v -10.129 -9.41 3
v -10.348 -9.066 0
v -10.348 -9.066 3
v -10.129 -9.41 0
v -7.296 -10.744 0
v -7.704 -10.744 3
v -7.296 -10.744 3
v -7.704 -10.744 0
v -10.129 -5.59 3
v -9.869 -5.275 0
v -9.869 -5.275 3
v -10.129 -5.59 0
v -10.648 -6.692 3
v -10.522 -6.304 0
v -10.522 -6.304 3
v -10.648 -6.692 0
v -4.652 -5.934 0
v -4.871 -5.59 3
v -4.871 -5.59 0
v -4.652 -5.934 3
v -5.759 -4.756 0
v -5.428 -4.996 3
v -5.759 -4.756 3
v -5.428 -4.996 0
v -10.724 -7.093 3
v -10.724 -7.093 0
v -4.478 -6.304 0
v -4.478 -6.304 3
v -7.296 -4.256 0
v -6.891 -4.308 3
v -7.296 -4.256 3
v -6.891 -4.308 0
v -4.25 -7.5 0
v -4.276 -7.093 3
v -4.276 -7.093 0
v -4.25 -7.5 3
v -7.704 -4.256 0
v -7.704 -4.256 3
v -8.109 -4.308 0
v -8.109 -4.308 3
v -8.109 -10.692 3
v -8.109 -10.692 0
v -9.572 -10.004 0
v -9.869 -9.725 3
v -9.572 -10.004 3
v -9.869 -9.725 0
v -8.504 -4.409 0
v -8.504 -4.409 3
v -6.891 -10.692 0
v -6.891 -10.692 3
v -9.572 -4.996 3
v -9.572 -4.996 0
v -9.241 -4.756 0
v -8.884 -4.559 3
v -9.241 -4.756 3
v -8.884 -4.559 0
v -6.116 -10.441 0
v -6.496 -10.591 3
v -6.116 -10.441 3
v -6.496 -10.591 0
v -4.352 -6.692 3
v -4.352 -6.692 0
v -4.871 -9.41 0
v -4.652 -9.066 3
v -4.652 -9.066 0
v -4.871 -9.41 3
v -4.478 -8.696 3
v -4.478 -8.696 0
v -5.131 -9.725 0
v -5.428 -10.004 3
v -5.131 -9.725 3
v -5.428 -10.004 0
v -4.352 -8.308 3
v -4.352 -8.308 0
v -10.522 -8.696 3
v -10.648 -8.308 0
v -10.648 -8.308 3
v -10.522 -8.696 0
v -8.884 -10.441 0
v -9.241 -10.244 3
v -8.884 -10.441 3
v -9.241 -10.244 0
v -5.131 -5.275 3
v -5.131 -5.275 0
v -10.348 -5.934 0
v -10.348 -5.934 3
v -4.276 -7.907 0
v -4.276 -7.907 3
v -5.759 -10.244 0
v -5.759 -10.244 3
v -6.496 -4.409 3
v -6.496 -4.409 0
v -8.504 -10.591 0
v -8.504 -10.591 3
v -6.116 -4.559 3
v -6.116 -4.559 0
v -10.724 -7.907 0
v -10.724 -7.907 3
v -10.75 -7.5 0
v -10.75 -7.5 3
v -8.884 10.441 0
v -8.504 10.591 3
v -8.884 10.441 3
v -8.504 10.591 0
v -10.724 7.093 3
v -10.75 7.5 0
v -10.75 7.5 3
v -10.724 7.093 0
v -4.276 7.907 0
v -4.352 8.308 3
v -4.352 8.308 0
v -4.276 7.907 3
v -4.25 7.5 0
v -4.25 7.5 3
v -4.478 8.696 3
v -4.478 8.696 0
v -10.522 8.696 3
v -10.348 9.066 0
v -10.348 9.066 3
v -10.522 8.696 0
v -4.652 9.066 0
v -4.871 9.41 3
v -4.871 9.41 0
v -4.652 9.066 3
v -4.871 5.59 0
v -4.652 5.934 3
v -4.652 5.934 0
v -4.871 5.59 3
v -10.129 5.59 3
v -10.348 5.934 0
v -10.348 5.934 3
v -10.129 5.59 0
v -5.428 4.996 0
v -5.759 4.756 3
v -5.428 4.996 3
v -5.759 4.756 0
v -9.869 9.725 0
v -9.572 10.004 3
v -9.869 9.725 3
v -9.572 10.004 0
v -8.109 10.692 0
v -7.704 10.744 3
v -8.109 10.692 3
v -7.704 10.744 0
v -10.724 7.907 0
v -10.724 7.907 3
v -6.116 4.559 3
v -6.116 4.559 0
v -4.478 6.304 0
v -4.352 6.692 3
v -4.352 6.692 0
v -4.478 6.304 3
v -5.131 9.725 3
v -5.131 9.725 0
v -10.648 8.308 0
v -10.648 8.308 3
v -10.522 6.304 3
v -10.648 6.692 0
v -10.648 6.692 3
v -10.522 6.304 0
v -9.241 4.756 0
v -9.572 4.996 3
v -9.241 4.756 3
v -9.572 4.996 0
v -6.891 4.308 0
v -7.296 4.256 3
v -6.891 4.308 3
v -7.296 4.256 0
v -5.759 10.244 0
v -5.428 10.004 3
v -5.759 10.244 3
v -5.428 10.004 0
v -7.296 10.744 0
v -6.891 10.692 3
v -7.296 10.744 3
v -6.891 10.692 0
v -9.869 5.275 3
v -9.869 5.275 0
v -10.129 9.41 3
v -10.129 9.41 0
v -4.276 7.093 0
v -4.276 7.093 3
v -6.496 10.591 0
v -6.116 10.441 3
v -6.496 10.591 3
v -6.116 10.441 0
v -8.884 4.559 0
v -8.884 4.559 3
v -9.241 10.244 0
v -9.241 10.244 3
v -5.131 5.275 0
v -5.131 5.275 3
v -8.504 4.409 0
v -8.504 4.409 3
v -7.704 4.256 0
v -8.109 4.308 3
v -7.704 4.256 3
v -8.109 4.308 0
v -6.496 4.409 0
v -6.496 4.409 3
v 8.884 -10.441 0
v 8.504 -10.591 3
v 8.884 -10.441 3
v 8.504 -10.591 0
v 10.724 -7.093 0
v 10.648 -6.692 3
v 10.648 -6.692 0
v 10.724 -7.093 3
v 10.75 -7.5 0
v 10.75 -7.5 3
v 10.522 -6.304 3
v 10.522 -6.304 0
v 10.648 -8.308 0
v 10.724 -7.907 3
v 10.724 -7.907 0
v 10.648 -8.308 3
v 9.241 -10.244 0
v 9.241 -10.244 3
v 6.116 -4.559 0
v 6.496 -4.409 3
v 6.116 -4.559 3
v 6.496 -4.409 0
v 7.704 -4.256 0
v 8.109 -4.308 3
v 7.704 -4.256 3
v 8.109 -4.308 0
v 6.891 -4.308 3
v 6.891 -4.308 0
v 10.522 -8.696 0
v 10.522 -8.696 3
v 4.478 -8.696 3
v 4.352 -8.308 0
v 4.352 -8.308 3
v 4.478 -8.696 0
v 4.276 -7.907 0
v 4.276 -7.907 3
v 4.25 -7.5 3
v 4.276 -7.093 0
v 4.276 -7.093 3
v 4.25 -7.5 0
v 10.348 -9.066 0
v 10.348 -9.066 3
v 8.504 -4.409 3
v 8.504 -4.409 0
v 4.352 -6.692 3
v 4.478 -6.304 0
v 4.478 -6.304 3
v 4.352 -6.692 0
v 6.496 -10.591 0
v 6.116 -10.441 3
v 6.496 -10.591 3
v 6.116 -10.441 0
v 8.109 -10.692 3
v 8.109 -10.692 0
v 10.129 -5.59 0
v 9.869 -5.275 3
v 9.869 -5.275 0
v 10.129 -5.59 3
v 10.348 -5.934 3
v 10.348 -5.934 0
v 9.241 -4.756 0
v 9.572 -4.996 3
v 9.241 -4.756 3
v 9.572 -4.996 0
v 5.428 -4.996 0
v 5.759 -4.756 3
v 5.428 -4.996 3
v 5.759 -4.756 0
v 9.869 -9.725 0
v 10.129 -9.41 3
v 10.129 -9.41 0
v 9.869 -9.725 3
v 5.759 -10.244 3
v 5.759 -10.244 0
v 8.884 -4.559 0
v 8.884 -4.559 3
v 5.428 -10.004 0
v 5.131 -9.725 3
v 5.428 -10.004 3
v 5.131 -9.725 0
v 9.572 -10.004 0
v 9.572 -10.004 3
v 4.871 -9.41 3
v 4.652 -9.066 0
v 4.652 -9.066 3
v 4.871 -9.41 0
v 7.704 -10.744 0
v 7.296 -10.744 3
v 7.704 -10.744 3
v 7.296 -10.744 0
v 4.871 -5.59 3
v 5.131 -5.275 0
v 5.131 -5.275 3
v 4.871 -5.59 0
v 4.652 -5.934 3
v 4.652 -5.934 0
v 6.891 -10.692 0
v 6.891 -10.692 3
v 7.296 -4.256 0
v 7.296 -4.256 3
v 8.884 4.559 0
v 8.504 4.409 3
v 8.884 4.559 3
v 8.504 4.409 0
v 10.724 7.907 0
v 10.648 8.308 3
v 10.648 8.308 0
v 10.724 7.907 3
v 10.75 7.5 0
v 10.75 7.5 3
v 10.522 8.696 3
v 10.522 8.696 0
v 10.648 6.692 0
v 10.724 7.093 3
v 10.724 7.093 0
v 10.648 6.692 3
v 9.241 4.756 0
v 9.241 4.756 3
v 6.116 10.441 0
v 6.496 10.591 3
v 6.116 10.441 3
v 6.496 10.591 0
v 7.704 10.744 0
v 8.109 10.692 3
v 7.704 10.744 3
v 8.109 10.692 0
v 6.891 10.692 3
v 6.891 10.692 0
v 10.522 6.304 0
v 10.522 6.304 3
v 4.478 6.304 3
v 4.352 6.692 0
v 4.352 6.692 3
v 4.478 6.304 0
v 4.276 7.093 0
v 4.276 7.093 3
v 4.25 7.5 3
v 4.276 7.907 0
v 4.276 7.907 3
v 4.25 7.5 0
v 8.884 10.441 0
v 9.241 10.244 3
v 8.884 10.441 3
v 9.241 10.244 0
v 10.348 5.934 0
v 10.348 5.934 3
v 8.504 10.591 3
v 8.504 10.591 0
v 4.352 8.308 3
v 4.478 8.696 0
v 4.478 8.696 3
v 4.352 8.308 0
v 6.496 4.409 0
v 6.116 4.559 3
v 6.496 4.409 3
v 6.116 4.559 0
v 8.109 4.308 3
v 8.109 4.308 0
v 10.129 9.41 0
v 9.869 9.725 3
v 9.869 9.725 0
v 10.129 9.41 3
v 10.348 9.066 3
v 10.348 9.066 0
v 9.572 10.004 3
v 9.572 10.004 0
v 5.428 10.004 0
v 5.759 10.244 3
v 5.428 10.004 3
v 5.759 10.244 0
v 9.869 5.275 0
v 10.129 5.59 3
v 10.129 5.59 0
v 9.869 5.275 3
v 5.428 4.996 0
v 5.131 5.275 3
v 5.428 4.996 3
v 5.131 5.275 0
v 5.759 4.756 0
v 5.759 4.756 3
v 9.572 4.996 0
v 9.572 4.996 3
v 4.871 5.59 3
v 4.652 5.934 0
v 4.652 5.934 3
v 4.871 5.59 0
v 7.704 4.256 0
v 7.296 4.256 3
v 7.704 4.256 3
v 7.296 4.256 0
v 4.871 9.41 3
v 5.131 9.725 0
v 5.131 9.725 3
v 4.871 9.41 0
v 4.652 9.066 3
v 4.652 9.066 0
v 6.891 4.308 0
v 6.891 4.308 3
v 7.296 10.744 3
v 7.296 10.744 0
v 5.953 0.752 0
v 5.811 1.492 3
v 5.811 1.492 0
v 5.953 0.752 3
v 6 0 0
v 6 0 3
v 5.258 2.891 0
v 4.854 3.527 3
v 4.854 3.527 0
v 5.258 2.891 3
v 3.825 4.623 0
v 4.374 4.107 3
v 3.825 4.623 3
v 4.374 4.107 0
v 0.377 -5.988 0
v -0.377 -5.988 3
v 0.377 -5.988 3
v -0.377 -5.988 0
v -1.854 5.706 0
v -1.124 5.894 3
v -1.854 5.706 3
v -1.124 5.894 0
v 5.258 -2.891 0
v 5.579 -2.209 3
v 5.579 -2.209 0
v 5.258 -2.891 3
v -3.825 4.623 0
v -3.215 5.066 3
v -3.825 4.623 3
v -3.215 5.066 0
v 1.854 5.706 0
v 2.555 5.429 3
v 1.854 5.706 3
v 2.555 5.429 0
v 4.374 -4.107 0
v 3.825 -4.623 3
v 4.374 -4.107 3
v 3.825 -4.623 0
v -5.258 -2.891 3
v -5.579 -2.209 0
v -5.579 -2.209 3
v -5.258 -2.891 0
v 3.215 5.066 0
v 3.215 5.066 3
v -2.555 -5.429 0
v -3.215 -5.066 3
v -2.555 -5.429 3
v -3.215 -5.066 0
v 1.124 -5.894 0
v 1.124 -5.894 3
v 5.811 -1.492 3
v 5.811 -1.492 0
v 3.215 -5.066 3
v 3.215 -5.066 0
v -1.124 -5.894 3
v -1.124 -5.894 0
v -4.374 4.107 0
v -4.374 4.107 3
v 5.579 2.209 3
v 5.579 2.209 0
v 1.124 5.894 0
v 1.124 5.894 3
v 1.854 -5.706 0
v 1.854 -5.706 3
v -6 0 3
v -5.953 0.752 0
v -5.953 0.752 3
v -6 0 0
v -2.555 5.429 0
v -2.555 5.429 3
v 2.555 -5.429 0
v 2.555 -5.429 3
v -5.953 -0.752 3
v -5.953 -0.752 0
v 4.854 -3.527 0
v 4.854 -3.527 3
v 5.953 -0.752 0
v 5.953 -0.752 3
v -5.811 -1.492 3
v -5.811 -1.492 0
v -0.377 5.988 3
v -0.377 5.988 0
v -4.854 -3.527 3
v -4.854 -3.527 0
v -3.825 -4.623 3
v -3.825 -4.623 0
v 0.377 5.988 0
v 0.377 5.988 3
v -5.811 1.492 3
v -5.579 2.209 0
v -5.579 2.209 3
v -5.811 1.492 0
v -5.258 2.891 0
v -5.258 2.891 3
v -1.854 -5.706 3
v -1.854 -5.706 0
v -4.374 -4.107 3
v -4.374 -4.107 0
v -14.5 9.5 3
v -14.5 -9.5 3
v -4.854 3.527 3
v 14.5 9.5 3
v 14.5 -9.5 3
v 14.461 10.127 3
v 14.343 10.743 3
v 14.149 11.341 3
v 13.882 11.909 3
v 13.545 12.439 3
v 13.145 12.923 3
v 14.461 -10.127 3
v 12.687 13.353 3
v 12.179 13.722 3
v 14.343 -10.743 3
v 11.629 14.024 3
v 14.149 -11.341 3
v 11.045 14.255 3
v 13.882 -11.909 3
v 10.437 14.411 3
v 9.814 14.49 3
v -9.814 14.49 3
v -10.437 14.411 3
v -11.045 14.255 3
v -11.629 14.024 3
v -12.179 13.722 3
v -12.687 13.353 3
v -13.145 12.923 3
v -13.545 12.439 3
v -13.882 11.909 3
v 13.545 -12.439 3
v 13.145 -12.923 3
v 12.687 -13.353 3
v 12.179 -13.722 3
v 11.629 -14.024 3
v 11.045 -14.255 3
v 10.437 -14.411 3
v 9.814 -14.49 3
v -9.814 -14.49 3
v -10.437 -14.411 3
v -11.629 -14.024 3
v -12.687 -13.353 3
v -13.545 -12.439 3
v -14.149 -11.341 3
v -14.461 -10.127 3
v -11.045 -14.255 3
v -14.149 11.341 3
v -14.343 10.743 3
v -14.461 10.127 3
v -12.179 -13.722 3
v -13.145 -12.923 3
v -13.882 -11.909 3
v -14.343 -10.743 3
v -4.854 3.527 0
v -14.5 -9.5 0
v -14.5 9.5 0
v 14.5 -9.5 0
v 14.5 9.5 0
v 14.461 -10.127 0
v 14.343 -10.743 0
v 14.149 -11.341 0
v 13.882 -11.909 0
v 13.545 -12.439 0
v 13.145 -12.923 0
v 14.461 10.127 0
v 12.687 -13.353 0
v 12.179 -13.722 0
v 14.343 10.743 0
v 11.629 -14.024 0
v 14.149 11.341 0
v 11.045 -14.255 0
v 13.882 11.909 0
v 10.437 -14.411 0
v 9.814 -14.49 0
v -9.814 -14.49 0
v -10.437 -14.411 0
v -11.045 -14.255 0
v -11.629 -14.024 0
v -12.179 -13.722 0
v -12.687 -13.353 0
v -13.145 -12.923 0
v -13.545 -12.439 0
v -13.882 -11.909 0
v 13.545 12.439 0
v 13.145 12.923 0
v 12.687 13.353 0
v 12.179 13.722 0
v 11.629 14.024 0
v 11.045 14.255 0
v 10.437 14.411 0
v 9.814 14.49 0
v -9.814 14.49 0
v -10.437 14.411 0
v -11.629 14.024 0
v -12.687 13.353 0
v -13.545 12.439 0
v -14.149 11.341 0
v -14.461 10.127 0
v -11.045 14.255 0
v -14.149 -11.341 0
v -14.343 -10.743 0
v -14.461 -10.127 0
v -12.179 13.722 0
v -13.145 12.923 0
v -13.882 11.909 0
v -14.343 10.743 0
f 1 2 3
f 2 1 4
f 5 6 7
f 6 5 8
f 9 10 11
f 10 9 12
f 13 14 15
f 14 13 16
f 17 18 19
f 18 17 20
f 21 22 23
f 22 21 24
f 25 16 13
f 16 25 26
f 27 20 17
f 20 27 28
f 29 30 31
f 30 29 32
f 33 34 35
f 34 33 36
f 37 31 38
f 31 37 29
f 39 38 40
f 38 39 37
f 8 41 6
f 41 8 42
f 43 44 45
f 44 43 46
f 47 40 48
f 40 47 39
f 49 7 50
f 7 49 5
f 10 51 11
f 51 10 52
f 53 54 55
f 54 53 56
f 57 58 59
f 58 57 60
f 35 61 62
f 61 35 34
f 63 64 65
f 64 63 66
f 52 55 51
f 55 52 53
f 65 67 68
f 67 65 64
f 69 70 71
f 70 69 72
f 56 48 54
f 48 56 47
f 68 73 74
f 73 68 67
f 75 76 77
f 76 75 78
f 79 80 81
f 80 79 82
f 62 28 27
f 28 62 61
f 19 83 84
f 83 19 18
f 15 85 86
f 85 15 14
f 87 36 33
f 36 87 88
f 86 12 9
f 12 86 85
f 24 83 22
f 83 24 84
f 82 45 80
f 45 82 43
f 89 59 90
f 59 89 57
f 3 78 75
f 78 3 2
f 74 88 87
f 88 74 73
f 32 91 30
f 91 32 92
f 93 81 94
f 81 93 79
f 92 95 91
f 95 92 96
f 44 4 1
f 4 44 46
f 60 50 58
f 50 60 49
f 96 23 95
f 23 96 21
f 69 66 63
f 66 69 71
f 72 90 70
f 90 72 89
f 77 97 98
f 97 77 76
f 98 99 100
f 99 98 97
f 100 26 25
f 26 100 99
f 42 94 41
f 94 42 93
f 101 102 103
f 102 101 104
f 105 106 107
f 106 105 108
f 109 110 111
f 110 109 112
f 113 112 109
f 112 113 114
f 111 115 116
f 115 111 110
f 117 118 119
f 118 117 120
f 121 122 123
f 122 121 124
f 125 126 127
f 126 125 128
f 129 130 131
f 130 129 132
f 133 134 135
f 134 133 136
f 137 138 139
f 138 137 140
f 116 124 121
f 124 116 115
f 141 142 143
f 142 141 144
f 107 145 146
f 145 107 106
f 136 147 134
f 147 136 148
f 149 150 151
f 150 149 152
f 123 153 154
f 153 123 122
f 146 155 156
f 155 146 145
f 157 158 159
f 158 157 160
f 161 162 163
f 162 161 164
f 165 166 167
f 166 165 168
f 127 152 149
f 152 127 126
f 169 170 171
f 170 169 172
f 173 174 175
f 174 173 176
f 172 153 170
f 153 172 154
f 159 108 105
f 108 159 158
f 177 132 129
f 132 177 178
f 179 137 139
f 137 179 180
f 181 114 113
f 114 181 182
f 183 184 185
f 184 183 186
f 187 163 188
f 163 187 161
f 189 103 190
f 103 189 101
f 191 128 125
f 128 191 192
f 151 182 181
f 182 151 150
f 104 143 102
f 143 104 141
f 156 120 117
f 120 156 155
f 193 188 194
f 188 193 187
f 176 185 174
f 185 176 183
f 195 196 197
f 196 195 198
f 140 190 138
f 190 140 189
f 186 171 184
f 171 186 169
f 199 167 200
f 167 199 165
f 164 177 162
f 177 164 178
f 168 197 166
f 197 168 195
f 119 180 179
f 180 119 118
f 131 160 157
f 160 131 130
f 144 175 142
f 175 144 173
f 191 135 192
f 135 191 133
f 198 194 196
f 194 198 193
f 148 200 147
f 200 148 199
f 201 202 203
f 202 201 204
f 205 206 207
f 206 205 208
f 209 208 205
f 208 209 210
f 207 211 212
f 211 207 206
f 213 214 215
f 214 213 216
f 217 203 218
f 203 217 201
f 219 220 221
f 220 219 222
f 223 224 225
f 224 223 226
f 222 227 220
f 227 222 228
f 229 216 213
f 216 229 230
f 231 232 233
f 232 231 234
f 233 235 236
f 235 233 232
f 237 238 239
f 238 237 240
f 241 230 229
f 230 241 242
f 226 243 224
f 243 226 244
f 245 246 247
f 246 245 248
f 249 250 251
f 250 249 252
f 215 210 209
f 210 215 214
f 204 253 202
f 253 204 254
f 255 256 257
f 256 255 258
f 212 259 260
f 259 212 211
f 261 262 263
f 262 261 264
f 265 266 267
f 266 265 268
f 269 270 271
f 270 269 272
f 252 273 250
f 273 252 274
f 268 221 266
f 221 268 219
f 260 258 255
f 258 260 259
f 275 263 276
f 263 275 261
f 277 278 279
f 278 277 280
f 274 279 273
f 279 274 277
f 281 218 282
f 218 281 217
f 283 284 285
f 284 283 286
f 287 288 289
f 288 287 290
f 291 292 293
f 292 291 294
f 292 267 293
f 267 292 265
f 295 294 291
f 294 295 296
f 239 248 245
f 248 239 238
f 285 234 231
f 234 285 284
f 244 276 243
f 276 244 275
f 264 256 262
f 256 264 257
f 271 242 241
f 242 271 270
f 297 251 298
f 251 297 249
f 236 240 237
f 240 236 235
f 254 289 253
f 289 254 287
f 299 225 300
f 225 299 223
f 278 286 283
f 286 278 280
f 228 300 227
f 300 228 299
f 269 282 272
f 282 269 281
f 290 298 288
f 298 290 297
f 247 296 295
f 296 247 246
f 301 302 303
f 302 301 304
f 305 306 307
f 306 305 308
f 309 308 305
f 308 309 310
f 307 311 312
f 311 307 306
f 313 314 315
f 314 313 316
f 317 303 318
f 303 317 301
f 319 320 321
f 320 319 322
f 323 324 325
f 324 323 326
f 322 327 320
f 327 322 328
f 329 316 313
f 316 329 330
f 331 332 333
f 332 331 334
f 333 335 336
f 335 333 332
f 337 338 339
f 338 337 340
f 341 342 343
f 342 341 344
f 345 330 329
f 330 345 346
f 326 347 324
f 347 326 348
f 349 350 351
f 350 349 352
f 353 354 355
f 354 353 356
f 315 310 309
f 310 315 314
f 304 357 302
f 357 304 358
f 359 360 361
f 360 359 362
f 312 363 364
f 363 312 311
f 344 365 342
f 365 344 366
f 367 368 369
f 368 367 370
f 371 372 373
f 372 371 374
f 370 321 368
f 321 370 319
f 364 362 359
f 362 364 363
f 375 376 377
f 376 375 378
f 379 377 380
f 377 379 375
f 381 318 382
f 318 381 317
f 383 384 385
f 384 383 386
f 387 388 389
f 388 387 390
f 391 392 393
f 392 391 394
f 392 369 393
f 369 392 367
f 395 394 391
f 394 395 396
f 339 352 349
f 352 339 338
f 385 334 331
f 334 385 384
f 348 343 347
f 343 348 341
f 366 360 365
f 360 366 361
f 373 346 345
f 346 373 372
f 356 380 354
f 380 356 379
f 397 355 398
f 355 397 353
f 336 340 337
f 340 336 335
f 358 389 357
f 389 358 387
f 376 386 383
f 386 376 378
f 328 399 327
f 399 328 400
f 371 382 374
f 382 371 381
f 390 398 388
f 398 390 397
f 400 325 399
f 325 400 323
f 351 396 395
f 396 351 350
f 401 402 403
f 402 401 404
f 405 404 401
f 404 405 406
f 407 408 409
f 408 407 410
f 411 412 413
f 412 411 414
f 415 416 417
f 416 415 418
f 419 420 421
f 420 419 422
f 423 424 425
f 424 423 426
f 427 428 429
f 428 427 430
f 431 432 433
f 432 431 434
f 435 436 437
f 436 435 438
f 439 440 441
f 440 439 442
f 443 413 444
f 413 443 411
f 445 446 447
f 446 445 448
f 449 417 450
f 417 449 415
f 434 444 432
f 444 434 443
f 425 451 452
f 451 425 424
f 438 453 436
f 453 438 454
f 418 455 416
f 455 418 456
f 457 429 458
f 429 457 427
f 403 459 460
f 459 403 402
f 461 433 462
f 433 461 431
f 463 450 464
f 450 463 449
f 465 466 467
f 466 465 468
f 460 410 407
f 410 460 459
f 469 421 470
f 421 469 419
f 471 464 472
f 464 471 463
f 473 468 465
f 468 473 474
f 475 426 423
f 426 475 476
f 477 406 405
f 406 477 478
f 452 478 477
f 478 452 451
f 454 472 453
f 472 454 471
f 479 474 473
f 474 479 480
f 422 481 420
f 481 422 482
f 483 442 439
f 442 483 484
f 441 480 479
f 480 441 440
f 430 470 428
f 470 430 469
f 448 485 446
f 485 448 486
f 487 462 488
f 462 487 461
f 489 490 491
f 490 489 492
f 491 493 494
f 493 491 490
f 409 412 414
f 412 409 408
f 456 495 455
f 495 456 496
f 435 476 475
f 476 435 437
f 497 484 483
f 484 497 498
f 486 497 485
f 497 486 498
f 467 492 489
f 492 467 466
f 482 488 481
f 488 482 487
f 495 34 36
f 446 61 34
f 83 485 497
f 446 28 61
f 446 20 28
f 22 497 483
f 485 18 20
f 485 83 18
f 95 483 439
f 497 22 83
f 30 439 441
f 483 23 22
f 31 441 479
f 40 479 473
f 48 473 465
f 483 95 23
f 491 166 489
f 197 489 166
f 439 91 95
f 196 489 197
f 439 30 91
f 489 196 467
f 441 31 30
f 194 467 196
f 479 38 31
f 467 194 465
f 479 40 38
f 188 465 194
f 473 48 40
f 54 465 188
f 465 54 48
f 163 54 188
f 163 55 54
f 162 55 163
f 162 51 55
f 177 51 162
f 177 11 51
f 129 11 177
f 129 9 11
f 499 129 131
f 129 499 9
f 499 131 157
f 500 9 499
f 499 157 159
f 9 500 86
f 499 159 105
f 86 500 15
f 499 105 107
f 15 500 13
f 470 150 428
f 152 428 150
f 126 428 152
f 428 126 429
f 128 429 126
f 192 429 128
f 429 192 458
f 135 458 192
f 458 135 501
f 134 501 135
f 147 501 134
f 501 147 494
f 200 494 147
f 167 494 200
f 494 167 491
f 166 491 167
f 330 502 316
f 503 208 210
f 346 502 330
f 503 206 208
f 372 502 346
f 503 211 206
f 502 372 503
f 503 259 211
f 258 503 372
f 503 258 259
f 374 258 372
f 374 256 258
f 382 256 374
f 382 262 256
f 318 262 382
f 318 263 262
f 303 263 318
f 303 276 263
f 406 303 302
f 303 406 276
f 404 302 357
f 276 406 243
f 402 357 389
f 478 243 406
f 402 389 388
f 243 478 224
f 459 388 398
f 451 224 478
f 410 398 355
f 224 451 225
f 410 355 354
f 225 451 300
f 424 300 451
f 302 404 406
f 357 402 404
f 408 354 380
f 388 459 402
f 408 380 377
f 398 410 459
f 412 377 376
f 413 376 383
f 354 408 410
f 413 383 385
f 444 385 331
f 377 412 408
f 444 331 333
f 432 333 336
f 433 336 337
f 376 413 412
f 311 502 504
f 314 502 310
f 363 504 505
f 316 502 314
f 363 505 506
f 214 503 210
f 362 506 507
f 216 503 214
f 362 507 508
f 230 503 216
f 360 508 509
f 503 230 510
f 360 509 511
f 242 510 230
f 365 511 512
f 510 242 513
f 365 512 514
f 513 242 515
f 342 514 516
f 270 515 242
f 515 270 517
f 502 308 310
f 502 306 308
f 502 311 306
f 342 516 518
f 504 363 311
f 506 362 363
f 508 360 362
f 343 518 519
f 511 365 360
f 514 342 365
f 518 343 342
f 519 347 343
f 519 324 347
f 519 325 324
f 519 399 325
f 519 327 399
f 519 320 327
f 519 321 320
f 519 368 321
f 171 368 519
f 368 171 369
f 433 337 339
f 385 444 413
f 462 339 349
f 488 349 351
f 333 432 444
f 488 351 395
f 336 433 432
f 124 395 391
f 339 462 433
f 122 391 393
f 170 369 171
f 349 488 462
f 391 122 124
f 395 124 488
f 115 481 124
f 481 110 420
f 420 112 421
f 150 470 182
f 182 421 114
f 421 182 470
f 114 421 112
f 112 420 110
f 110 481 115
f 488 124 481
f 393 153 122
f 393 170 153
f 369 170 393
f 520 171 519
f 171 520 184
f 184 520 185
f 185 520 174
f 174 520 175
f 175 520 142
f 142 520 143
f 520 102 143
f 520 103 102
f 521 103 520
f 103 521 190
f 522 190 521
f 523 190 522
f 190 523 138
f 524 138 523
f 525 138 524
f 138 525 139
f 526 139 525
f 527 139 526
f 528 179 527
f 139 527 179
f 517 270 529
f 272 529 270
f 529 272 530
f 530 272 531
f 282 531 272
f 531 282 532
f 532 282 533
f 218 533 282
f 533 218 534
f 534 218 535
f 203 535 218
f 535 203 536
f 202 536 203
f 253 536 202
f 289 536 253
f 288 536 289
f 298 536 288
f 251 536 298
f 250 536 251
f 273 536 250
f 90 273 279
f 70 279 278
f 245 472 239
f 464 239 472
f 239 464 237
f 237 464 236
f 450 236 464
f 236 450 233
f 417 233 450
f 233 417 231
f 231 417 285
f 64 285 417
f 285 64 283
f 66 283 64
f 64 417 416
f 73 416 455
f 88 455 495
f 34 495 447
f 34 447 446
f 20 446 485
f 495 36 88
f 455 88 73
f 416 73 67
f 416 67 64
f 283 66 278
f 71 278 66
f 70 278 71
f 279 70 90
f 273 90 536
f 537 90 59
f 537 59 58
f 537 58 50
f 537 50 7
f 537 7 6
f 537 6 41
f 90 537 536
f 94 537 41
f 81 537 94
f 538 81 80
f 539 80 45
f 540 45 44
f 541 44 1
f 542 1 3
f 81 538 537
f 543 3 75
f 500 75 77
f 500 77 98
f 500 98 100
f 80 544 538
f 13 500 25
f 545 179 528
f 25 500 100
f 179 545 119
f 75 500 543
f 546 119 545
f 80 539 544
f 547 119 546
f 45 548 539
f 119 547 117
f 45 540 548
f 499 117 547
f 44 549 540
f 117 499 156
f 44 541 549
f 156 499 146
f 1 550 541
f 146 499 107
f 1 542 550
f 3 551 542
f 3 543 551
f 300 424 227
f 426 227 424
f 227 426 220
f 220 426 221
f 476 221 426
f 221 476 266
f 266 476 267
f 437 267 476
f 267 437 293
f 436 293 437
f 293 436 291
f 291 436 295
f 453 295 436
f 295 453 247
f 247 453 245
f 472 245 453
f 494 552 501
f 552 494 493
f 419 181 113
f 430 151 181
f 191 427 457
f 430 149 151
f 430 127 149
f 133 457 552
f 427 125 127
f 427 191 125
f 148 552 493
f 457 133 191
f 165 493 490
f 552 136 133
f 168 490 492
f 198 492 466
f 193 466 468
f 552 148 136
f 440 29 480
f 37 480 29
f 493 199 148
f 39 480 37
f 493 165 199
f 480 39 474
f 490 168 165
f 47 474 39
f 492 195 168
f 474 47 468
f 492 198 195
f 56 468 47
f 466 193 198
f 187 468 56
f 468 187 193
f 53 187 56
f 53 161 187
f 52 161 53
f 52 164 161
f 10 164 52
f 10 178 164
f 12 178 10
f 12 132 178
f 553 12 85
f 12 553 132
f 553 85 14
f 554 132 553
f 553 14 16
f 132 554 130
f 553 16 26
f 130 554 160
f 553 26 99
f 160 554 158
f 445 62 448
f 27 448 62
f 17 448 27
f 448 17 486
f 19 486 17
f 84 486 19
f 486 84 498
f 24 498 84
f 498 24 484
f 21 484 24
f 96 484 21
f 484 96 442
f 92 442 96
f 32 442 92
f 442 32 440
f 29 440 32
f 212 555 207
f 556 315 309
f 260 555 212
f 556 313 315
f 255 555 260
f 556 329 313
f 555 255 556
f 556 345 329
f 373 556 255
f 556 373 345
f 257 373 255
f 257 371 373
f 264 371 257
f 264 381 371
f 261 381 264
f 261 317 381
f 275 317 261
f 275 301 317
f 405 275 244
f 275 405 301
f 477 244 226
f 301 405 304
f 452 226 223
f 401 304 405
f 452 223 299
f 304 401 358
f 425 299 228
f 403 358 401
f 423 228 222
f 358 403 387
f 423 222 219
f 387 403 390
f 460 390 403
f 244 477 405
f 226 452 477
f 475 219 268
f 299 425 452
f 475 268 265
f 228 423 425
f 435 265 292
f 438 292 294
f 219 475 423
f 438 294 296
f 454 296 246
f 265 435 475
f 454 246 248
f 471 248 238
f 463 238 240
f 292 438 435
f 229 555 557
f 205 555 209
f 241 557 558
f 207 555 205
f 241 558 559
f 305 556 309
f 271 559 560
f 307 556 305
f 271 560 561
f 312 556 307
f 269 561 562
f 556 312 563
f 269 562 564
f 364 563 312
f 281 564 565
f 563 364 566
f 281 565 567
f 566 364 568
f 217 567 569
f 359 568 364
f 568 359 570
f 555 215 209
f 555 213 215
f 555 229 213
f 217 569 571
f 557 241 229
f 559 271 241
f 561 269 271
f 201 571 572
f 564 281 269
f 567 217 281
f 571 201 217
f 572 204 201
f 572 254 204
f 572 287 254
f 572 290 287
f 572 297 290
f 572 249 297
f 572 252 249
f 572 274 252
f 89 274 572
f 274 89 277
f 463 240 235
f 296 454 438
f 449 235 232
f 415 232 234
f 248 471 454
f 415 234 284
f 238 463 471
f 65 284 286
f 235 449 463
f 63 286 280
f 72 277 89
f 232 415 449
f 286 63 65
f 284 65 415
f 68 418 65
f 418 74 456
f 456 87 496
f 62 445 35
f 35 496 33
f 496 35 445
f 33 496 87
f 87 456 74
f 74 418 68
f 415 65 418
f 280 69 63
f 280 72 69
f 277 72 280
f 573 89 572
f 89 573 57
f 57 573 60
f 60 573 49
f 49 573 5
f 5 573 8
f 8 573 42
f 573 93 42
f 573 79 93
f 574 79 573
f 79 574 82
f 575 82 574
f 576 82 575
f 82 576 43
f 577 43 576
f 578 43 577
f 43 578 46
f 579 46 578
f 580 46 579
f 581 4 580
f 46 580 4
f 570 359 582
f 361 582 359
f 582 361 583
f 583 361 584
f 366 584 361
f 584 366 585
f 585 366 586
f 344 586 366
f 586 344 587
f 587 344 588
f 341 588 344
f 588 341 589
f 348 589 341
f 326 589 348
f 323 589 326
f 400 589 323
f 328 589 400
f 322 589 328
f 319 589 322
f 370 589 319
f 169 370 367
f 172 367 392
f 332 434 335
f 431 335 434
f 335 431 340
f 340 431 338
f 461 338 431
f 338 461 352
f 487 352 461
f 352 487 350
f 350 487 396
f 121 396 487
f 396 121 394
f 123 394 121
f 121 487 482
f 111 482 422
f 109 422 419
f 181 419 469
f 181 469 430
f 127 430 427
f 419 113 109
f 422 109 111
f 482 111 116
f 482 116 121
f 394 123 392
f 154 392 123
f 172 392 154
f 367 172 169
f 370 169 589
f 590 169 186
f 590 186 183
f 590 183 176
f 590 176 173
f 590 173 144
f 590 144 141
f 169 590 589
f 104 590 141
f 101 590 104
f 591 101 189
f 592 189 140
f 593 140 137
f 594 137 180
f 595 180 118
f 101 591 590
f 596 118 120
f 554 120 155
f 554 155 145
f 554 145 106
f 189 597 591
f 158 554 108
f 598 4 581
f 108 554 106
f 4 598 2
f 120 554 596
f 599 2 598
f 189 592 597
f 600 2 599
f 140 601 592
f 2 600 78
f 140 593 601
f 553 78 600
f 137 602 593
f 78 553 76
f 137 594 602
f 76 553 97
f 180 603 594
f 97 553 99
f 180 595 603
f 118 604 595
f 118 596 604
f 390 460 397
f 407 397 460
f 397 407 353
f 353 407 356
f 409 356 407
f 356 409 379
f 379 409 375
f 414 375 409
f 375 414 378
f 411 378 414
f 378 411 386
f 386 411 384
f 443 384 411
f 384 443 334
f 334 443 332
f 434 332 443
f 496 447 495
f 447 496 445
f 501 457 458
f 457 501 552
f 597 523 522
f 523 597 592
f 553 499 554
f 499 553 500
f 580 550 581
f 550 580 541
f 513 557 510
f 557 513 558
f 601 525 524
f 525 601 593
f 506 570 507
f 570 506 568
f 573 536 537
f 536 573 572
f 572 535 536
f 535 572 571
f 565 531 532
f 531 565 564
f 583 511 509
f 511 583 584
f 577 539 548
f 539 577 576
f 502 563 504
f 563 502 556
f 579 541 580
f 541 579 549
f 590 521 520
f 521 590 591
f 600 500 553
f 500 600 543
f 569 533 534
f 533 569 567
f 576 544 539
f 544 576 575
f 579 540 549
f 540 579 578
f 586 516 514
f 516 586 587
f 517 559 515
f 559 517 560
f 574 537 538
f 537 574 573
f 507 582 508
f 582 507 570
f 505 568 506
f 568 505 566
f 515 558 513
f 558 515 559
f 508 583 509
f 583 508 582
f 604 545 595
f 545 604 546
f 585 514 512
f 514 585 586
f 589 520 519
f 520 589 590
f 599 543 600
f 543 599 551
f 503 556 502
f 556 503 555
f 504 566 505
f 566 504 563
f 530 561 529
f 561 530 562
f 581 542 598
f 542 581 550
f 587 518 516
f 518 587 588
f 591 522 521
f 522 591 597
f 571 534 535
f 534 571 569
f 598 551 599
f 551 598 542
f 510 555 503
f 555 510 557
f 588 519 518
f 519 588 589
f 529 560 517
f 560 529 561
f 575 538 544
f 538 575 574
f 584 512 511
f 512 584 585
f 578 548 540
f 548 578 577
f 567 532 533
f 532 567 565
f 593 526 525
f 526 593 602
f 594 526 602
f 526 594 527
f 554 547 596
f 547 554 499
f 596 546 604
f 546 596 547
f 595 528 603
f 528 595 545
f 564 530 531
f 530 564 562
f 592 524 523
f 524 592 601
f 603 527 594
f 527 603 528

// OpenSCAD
$fn = 50;


difference() {
	union() {
		hull() {
			translate(v = [-9.5000000000, 9.5000000000, 0]) {
				cylinder(h = 3, r = 5);
			}
			translate(v = [9.5000000000, 9.5000000000, 0]) {
				cylinder(h = 3, r = 5);
			}
			translate(v = [-9.5000000000, -9.5000000000, 0]) {
				cylinder(h = 3, r = 5);
			}
			translate(v = [9.5000000000, -9.5000000000, 0]) {
				cylinder(h = 3, r = 5);
			}
		}
	}
	union() {
		#translate(v = [-7.5000000000, -7.5000000000, -100.0000000000]) {
			cylinder(h = 200, r = 3.2500000000);
		}
		#translate(v = [-7.5000000000, 7.5000000000, -100.0000000000]) {
			cylinder(h = 200, r = 3.2500000000);
		}
		#translate(v = [7.5000000000, -7.5000000000, -100.0000000000]) {
			cylinder(h = 200, r = 3.2500000000);
		}
		#translate(v = [7.5000000000, 7.5000000000, -100.0000000000]) {
			cylinder(h = 200, r = 3.2500000000);
		}
		#cylinder(h = 3, r = 6.0000000000);
	}
}
